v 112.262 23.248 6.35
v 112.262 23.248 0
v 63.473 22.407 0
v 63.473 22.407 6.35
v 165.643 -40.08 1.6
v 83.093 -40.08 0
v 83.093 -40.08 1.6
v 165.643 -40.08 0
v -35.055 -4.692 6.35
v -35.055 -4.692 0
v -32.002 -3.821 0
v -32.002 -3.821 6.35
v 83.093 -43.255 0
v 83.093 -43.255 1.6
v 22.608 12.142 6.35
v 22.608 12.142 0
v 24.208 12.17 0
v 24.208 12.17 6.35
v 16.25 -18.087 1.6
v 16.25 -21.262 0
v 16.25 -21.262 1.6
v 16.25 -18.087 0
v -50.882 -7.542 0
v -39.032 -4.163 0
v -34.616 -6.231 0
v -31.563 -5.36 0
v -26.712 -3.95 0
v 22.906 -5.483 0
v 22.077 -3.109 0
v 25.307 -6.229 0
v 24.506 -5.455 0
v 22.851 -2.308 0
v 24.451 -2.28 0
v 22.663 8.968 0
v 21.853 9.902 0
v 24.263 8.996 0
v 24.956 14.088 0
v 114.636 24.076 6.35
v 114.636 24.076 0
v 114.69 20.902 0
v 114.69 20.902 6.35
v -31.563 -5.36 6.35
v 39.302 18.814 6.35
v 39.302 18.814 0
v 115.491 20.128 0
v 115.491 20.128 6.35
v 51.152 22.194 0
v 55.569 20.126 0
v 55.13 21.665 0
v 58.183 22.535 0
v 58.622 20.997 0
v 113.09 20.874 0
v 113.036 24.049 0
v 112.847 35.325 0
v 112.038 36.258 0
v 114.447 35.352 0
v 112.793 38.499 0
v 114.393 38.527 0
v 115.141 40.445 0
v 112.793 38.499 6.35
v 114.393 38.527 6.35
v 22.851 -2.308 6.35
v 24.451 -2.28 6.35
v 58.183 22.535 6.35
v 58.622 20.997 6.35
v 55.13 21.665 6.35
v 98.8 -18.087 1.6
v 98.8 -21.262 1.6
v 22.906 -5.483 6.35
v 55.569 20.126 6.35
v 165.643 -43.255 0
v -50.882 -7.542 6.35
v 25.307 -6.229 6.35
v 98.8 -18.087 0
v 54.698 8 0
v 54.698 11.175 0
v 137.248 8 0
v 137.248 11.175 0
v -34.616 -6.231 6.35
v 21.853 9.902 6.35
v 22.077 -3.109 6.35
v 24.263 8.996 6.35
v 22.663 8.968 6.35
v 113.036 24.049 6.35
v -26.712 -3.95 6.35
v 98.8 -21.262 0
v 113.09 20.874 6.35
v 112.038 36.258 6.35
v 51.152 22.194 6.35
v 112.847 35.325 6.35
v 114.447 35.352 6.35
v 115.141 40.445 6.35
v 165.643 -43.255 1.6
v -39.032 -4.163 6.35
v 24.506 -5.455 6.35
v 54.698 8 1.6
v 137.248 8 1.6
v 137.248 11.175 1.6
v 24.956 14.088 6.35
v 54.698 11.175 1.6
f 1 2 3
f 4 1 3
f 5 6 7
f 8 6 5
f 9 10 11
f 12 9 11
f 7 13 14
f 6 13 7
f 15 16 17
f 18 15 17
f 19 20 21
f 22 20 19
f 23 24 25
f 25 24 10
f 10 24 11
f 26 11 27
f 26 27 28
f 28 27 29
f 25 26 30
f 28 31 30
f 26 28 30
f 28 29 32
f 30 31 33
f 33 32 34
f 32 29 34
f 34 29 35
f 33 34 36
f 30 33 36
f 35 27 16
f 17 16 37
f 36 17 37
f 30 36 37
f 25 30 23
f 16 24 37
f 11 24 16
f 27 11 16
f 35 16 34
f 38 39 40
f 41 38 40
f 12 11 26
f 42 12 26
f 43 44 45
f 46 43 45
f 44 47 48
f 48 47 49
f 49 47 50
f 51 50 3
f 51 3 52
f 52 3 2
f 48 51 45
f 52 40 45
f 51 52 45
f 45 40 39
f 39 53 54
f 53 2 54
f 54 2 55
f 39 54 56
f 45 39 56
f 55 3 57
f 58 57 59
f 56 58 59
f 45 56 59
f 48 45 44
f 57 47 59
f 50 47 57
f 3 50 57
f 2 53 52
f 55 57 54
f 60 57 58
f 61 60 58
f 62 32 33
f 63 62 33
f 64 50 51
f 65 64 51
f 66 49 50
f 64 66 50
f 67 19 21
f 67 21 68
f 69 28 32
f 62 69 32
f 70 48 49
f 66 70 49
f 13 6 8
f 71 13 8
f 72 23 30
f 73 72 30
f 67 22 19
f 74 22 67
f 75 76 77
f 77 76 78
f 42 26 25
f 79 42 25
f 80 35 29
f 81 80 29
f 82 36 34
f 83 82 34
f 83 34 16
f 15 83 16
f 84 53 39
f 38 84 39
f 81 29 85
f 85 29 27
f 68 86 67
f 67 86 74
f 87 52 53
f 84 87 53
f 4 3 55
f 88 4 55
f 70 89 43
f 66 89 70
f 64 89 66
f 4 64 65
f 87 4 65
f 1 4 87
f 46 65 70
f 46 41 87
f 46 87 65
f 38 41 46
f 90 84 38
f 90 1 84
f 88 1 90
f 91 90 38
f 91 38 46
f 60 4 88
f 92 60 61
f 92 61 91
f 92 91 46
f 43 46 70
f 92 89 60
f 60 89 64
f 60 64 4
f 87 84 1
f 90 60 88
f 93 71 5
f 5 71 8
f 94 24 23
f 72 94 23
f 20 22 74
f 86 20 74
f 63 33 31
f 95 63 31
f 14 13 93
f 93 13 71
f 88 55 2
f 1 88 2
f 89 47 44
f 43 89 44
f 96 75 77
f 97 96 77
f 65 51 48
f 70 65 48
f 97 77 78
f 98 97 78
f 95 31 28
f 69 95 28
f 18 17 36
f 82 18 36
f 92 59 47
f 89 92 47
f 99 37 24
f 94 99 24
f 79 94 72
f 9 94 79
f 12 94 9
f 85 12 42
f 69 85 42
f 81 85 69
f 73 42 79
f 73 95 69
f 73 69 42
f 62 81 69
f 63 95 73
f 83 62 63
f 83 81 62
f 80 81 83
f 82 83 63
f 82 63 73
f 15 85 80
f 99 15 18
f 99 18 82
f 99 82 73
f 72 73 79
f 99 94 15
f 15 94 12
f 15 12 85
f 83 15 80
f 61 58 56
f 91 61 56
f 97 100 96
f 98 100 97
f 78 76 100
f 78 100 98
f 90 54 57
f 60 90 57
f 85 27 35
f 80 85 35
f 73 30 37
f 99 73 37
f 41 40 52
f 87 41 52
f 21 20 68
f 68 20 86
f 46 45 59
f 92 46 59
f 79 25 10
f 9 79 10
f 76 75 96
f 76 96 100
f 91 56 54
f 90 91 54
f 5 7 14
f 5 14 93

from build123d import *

# Parameters (mm, degrees)
F1_DEPTH = 6.35
F3_DEPTH = 6.35
F4_W     = 82.55
F4_H     = 3.175
F5_DEPTH = 1.6002


with BuildPart() as f1:
    # F0 (on Top) → F1 (new body)
    with BuildSketch(Plane.XY):
        Polygon((51.15218, 22.194217), (39.302432, 18.814439), (115.491109, 20.128038), (115.140816, 40.445018), align=None)
        Polygon((55.568558, 20.125823), (55.129653, 21.664654), (58.18289, 22.535497), (58.621795, 20.996665), align=None, mode=Mode.SUBTRACT)
        Polygon((114.690252, 20.901747), (113.09029, 20.874161), (113.035557, 24.048689), (114.635519, 24.076275), align=None, mode=Mode.SUBTRACT)
        Polygon((112.037529, 36.258282), (112.261848, 23.247833), (63.472662, 22.406639), align=None, mode=Mode.SUBTRACT)
        Polygon((112.847493, 35.324723), (112.79276, 38.499251), (114.392722, 38.526837), (114.447455, 35.352309), align=None, mode=Mode.SUBTRACT)
    extrude(amount=F1_DEPTH)


with BuildPart() as f3:
    # F2 (on Top) → F3 (new body)
    with BuildSketch(Plane.XY):
        Polygon((-39.032226, -4.162543), (-50.881974, -7.542321), (25.306703, -6.228723), (24.95641, 14.088258), align=None)
        Polygon((-34.615848, -6.230938), (-35.054753, -4.692106), (-32.001516, -3.821264), (-31.562611, -5.360095), align=None, mode=Mode.SUBTRACT)
        Polygon((24.505846, -5.455014), (22.905884, -5.482599), (22.851151, -2.308071), (24.451113, -2.280485), align=None, mode=Mode.SUBTRACT)
        Polygon((21.853123, 9.901522), (22.077441, -3.108928), (-26.711744, -3.950121), align=None, mode=Mode.SUBTRACT)
        Polygon((22.663087, 8.967963), (22.608354, 12.142491), (24.208316, 12.170076), (24.263049, 8.995548), align=None, mode=Mode.SUBTRACT)
    extrude(amount=F3_DEPTH)


with BuildPart() as f5:
    # F4 (on Top) → F5 (new body)
    with BuildSketch(Plane.XY):
        with Locations((95.972613, 9.587606)):
            Rectangle(F4_W, F4_H)
        with Locations((57.524838, -19.674114)):
            Rectangle(F4_W, F4_H)
        with Locations((124.368329, -41.667347)):
            Rectangle(F4_W, F4_H)
    extrude(amount=F5_DEPTH)


solid = Compound([f1.part, f3.part, f5.part])
